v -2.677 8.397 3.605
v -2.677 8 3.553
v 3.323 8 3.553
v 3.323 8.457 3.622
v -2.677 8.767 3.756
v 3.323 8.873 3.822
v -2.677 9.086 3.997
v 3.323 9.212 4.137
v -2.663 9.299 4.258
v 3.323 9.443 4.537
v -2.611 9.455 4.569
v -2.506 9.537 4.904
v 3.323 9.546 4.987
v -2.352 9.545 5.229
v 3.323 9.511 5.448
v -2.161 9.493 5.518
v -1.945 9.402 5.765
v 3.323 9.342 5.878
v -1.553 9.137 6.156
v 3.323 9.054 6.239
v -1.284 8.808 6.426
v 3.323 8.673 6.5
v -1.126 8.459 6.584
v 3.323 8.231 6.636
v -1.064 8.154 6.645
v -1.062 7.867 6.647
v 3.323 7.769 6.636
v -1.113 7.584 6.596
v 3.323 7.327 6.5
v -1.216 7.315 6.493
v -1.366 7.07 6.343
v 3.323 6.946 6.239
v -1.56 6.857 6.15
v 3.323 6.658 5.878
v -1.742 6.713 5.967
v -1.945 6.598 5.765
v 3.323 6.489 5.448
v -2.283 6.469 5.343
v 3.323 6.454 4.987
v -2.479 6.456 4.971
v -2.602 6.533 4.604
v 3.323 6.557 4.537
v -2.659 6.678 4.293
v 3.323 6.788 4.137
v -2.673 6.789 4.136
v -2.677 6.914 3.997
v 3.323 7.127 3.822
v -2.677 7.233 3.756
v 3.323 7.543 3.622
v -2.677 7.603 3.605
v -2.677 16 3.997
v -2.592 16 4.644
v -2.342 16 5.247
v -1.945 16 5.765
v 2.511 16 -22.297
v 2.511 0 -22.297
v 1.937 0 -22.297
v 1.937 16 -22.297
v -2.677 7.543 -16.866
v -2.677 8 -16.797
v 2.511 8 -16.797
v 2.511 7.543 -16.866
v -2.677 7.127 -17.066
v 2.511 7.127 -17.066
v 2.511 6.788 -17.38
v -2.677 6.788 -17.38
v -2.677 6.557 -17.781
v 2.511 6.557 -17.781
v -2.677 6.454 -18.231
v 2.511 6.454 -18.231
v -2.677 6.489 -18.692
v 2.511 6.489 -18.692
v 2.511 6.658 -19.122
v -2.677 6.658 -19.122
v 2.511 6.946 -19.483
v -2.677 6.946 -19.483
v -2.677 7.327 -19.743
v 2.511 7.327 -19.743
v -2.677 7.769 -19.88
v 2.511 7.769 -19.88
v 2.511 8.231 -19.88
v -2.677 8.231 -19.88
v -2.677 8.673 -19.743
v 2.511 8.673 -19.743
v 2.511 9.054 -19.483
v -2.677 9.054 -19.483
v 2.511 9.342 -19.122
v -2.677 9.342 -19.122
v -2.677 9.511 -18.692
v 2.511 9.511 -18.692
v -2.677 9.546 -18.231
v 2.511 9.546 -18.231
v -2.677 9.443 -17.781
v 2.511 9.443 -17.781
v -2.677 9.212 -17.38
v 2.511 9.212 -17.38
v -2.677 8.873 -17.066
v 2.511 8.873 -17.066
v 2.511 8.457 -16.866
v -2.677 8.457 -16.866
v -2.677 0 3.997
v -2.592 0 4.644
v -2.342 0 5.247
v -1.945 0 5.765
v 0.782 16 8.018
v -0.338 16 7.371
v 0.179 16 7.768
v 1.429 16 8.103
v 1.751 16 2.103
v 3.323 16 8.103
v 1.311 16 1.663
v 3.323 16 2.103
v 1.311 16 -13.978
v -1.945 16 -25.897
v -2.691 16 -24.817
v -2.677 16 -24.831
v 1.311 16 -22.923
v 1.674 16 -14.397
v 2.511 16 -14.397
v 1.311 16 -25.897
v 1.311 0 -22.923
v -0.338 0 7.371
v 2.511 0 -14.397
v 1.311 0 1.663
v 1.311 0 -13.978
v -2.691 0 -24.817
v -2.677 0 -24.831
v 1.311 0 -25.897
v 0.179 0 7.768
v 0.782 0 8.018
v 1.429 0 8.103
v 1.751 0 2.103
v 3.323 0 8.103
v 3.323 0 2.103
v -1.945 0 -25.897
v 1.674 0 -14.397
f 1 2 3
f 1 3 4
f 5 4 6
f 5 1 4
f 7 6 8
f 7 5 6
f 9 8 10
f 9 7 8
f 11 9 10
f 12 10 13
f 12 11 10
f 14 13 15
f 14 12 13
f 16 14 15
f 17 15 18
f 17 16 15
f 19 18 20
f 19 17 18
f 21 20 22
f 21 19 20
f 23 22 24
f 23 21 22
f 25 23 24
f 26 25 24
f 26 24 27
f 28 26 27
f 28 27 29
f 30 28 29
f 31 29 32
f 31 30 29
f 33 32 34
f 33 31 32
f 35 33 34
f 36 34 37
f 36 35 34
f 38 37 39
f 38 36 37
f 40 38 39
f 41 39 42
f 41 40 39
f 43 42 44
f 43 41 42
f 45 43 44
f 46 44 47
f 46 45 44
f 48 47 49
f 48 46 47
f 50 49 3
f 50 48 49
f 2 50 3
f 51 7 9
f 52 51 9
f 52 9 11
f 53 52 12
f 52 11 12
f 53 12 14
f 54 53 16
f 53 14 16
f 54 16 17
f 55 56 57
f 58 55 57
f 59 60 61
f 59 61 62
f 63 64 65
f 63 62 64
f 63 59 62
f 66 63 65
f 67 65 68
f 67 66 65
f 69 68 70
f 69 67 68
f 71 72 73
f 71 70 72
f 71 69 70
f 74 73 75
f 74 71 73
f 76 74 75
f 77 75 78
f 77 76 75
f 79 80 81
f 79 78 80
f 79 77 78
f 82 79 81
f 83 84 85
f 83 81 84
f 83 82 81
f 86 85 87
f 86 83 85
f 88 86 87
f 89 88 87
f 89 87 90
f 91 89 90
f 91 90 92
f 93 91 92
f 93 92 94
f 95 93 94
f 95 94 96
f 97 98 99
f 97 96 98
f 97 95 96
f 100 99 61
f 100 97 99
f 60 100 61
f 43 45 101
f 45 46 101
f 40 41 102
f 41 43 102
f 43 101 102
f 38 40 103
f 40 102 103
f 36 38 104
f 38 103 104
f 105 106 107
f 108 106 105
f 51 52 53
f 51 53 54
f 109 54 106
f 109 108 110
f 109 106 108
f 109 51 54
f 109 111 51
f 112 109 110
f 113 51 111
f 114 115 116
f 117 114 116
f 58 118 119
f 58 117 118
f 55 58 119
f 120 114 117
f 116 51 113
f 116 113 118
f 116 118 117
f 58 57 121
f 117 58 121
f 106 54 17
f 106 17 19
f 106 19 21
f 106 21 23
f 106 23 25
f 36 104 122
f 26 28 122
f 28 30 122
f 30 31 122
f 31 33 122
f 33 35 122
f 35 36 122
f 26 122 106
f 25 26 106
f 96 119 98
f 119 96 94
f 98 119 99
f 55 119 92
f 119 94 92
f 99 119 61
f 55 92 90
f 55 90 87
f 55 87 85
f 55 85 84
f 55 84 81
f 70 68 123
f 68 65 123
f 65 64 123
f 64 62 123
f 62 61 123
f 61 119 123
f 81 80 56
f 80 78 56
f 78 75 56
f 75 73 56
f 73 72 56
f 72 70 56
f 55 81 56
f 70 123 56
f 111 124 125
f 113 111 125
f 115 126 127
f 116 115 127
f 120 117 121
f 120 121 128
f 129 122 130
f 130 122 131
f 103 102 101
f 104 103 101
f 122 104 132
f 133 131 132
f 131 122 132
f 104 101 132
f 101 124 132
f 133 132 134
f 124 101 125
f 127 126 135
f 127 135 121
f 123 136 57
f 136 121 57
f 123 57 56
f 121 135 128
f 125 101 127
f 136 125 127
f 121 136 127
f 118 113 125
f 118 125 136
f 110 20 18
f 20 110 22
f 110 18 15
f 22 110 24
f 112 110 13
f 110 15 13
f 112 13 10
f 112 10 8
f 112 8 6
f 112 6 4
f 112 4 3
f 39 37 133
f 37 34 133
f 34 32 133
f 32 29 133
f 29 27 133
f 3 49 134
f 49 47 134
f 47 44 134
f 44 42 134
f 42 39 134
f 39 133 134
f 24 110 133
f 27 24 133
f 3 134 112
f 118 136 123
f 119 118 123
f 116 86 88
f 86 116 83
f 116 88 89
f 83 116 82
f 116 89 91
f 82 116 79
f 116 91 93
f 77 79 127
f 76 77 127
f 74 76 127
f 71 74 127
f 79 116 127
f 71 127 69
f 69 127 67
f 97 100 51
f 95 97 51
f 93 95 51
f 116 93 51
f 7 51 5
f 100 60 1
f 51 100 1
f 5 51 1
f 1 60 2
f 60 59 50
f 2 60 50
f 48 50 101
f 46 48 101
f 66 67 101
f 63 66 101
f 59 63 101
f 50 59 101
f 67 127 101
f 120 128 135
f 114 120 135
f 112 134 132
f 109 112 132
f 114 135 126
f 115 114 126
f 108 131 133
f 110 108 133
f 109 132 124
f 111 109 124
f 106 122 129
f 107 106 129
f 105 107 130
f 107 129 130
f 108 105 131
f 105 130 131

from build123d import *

# Parameters (mm, degrees)
EXTRUDE_1_DEPTH          = 16
CUT_EXTRUDE_1_DEPTH      = 31.882108434
CUT_EXTRUDE_1_DEPTH_BACK = 31.882108434
SKETCH_2_R               = 1.55


with BuildPart() as part:
    # ｽｹｯﾁ1 → ﾎﾞｽ - 押し出し1 (new body)
    with BuildSketch(Plane(origin=(0, 0, 0), x_dir=(1, 0, 0), z_dir=(0, 1, 0))):
        with BuildLine():
            Line((1.311036439, 22.922778474), (1.311036439, 25.896873144))
            Line((1.311036439, 25.896873144), (-1.944631198, 25.896873144))
            Line((-1.944631198, 25.896873144), (-2.690557808, 24.817055549))
            Line((-2.690557808, 24.817055549), (-2.676864245, 24.830749112))
            Line((-2.676864245, 24.830749112), (-2.676864245, 17.239005736))
            Line((-2.676864245, 17.239005736), (-2.676864245, -3.996970874))
            ThreePointArc((-2.676864245, -3.996970874), (-2.486563076, -4.953679455), (-1.944631198, -5.764737827))
            Line((-1.944631198, -5.764737827), (-0.338475216, -7.370893809))
            ThreePointArc((-0.338475216, -7.370893809), (0.472583156, -7.912825688), (1.429291737, -8.103126856))
            Line((1.429291737, -8.103126856), (3.323135755, -8.103126856))
            Line((3.323135755, -8.103126856), (3.323135755, -2.103126856))
            Line((3.323135755, -2.103126856), (1.751325003, -2.103126856))
            Line((1.751325003, -2.103126856), (1.311036439, -1.662838292))
            Line((1.311036439, -1.662838292), (1.311036439, 13.978392046))
            Line((1.311036439, 13.978392046), (1.674004174, 14.396873144))
            Line((1.674004174, 14.396873144), (2.511036439, 14.396873144))
            Line((2.511036439, 14.396873144), (2.511036439, 22.296873144))
            Line((2.511036439, 22.296873144), (1.936941769, 22.296873144))
            Line((1.936941769, 22.296873144), (1.311036439, 22.922778474))
        make_face()
    extrude(amount=EXTRUDE_1_DEPTH)

    # ｽｹｯﾁ2 → ｶｯﾄ - 押し出し1 (cut, two sides: drawn at the far end of the back side and taken through both)
    with BuildSketch(Plane(origin=(2.511036439, 0, 0), x_dir=(0, 0, -1), z_dir=(1, 0, 0)).offset(-CUT_EXTRUDE_1_DEPTH_BACK)):
        with Locations(Location((18.346873144, 8, 0), (0, 0, 180))):
            Circle(SKETCH_2_R)
        with Locations((-5.103126856, 8)):
            Circle(SKETCH_2_R)
    extrude(amount=CUT_EXTRUDE_1_DEPTH + CUT_EXTRUDE_1_DEPTH_BACK, mode=Mode.SUBTRACT)


solid = part.part
